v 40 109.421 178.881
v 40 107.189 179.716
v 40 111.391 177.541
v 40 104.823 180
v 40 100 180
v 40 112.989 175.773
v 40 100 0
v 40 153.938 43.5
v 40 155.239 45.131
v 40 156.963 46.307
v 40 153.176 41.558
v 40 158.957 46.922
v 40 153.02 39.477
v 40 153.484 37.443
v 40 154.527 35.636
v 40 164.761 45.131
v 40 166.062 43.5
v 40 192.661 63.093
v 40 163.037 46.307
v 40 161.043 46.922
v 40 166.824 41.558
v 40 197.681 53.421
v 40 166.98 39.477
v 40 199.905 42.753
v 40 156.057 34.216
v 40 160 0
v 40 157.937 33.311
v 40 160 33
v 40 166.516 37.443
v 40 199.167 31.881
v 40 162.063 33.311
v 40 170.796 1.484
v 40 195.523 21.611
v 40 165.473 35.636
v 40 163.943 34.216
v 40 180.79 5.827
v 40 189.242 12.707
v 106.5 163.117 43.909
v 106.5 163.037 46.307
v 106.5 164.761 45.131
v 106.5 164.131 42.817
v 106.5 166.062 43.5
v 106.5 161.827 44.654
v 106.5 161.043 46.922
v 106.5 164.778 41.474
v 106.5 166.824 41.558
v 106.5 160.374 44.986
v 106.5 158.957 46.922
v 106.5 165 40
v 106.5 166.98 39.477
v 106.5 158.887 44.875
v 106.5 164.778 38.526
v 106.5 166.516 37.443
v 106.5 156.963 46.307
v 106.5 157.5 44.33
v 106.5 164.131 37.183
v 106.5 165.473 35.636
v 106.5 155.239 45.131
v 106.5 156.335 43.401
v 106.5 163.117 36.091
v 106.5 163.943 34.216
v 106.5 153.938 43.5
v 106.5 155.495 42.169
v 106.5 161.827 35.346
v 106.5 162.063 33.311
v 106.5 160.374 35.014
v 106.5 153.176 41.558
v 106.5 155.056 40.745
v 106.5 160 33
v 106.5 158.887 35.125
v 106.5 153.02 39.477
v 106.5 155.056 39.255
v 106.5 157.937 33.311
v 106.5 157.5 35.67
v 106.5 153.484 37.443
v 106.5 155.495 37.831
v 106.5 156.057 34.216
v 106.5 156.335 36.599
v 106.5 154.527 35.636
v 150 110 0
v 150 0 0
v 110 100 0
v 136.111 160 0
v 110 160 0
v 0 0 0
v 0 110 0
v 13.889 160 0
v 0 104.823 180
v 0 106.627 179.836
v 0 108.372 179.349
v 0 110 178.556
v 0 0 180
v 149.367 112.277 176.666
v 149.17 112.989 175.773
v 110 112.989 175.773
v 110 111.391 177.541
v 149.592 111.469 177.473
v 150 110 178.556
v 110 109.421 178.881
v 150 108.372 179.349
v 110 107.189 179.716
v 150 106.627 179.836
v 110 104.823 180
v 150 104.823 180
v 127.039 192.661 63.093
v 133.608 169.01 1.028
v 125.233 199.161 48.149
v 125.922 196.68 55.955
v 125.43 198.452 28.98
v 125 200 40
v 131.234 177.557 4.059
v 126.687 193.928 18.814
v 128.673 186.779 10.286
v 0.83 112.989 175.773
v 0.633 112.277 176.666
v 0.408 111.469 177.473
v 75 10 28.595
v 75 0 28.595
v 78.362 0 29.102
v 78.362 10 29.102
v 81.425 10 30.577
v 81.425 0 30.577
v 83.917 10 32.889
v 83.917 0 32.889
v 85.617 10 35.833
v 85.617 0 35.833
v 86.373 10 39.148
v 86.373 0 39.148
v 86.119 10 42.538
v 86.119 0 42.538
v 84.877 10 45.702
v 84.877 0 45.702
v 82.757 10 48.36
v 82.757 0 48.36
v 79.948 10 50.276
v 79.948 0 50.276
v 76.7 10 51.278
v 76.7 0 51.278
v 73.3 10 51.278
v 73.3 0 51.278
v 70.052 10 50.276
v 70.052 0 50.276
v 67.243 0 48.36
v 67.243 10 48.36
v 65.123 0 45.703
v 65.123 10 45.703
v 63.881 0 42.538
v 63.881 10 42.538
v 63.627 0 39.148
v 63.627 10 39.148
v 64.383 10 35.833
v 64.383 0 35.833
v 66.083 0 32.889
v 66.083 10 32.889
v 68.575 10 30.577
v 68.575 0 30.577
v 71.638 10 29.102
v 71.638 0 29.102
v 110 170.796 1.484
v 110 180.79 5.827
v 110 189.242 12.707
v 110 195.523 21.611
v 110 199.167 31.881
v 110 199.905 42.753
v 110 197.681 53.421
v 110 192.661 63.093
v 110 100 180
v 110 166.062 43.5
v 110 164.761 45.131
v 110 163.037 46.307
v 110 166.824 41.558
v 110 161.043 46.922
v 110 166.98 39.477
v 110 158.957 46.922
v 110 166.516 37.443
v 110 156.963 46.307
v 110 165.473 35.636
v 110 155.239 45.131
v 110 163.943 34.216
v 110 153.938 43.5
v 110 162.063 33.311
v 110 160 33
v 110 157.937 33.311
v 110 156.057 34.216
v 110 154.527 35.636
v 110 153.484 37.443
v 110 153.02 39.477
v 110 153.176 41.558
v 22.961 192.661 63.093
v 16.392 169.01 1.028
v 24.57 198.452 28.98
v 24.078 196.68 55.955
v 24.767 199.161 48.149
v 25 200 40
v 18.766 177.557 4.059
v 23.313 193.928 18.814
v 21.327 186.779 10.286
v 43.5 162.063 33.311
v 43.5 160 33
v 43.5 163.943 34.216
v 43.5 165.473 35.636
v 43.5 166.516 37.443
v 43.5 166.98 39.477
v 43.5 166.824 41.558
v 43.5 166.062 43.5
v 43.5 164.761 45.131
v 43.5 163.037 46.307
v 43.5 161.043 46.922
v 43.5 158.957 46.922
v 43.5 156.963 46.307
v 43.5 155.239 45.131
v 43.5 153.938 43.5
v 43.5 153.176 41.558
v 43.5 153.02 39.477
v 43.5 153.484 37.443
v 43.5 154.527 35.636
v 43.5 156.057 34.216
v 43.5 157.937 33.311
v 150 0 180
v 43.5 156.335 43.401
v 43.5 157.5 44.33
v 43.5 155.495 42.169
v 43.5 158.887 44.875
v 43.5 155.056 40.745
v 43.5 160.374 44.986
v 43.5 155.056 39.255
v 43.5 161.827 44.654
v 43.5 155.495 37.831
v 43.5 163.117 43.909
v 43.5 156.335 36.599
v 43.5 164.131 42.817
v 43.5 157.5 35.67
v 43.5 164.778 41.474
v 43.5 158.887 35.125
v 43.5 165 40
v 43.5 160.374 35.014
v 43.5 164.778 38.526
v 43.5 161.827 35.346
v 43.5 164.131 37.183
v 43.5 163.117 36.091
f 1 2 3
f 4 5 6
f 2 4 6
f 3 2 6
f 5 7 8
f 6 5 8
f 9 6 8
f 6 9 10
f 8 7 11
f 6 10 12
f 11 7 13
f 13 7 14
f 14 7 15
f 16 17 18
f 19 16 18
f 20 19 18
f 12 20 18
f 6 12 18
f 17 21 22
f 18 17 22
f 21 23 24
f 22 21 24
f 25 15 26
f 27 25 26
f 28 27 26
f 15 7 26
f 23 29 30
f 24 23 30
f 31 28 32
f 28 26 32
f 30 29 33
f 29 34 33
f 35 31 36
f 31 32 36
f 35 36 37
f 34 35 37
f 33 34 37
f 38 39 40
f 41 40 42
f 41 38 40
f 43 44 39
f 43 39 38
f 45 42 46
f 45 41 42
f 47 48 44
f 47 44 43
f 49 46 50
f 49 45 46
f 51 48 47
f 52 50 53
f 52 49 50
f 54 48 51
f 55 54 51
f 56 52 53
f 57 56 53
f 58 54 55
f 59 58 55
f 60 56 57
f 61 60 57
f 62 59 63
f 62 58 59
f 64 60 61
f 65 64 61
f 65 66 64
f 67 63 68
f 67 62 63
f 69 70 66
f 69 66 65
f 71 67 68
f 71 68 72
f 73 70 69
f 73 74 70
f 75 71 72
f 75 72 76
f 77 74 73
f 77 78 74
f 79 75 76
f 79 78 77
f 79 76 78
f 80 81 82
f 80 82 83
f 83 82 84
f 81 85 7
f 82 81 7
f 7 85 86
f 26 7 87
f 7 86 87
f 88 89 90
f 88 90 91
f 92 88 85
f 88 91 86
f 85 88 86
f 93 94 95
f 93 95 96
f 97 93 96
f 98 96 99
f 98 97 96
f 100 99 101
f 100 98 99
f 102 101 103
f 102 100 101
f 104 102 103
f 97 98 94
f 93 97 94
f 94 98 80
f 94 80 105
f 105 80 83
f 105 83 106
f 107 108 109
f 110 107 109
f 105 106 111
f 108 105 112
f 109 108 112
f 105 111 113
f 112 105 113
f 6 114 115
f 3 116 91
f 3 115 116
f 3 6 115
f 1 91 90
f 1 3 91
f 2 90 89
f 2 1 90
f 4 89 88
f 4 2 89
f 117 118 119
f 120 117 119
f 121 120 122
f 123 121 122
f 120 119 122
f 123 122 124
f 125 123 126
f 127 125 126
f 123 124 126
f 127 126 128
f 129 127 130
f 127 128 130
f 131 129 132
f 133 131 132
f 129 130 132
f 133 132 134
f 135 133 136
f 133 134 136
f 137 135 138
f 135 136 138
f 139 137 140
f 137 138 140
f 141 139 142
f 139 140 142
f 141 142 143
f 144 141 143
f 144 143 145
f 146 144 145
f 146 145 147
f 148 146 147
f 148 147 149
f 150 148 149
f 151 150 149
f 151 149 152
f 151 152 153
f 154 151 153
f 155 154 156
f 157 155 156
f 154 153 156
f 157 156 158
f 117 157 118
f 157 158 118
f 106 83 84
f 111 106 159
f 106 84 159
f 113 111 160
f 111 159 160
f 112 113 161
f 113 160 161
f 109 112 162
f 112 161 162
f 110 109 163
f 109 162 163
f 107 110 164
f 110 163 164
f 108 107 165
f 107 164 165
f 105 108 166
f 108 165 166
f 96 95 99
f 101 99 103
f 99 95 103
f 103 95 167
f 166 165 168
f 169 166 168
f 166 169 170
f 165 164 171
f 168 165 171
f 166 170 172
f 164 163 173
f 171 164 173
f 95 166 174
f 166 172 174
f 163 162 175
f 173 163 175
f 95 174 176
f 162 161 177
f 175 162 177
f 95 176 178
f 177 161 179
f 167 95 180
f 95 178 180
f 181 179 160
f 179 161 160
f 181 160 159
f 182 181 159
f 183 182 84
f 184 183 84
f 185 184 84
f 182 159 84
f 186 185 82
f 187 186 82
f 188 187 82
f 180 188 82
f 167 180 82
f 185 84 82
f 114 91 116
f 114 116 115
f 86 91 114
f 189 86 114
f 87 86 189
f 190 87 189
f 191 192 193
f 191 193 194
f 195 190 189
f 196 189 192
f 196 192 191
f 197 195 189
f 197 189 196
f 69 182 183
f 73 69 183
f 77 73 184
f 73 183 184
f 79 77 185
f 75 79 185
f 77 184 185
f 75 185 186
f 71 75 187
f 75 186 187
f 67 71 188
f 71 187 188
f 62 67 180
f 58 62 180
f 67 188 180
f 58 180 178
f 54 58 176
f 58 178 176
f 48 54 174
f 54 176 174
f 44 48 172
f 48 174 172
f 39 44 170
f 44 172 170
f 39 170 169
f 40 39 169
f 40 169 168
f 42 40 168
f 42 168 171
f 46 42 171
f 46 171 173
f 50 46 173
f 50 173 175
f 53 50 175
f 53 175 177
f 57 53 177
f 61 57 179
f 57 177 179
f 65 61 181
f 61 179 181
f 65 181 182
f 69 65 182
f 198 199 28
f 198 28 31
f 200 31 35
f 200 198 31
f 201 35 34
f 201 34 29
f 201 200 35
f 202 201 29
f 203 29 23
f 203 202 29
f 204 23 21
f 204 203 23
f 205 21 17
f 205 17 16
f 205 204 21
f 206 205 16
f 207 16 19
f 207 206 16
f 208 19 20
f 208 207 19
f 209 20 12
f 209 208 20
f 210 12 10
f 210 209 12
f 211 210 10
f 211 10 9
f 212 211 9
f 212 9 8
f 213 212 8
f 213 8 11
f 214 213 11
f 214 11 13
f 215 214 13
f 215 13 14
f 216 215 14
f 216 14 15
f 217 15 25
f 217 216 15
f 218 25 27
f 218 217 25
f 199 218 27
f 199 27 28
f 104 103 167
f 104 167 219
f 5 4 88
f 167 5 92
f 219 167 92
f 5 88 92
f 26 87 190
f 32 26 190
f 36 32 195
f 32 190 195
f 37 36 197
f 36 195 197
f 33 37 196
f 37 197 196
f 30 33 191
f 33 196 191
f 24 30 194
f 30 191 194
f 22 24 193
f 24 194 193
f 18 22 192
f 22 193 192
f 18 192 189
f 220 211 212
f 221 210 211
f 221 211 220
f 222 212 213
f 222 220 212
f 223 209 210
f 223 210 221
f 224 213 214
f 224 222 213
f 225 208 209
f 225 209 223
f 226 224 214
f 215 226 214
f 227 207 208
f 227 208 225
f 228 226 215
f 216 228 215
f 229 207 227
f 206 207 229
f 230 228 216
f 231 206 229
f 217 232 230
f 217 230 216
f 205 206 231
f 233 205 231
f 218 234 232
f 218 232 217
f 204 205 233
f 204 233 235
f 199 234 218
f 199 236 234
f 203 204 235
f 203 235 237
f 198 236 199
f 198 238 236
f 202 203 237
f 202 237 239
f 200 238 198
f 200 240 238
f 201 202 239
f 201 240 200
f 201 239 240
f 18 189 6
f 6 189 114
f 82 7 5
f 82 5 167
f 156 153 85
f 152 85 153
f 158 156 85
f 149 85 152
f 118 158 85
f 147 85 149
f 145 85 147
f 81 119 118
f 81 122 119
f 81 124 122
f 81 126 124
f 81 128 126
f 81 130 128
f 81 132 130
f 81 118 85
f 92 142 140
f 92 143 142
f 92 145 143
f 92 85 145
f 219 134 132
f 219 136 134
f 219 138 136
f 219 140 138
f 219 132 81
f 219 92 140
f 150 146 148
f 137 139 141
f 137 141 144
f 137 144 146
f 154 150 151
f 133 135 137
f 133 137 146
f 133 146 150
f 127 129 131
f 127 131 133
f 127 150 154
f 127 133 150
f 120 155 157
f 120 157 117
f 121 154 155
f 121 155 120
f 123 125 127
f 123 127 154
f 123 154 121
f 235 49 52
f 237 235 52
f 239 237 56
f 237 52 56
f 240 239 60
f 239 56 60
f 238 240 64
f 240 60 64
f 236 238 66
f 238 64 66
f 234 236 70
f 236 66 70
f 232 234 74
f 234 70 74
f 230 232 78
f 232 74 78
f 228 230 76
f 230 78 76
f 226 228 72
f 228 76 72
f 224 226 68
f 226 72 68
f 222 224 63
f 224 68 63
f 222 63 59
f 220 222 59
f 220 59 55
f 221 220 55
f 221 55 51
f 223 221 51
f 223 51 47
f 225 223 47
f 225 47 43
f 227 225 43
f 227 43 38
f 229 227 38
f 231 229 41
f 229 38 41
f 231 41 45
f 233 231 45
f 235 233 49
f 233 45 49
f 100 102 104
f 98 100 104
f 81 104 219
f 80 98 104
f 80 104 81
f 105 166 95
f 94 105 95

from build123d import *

# Parameters (mm, degrees)
EXTRUDE_1_DEPTH         = 150
FILLET_1_R              = 10
CUT_EXTRUDE_1_DEPTH     = 309.058436015
SKETCH1_R               = 12.5
CUT_EXTRUDE1_DEPTH      = 10
CUT_EXTRUDE2_DEPTH      = 80
CUT_EXTRUDE2_DEPTH_BACK = 10
SKETCH2_R               = 5
SKETCH4_R               = 12.5
SKETCH4_R_2             = 11.405
BOSS_EXTRUDE1_DEPTH     = 10
SKETCH8_R               = 5
BOSS_EXTRUDE3_DEPTH     = 90
SKETCH9_R               = 7
SKETCH9_R_2             = 5
BOSS_EXTRUDE4_DEPTH     = 3.5
BOSS_EXTRUDE5_START     = 3.5
SKETCH10_R              = 7
SKETCH10_R_2            = 5
BOSS_EXTRUDE5_DEPTH     = 3.5


with BuildPart() as part:
    # 草圖1 → 填料-伸長1 (new body)
    with BuildSketch(Plane(origin=(0, 0, 0), x_dir=(0, 0, -1), z_dir=(1, 0, 0))):
        with BuildLine():
            Line((0, 0), (0, 160))
            ThreePointArc((0, 160), (-21.611444176, 195.522683101), (-63.093050736, 192.660542061))
            Line((-63.093050736, 192.660542061), (-180, 110))
            Line((-180, 110), (-180, 0))
            Line((-180, 0), (0, 0))
        make_face()
    extrude(amount=EXTRUDE_1_DEPTH)

    # 圓角1
    fillet_1_edges = [part.edges().sort_by_distance(p)[0] for p in [
        (75, 110, 180),
    ]]
    fillet(fillet_1_edges, radius=FILLET_1_R)

    # 草圖2 → 除料-伸長1 (cut, through all)
    with BuildSketch(Plane(origin=(0, 0, 0), x_dir=(-1, 0, 0), z_dir=(0, 0, -1))):
        Polygon((-150, 110), (-125, 200), (-125, 212.317241835), (-176.077029544, 212.317241835), (-176.077029544, 111.407234288), align=None)
        Polygon((-110, 110), (-110, 202.916849344), (-40, 202.916849344), (-40, 110), (-40, 100), (-110, 100), align=None)
        Polygon((26.077029544, 111.407234288), (0, 110), (-25, 200), (-25, 212.317241835), (26.077029544, 212.317241835), align=None)
    extrude(amount=-CUT_EXTRUDE_1_DEPTH, mode=Mode.SUBTRACT)

    # Sketch1 → Cut-Extrude1 (cut)
    with BuildSketch(Plane.XZ):
        with Locations(Location((75, 40, 0), (0, 0, 270))):
            Circle(SKETCH1_R)
    extrude(amount=-CUT_EXTRUDE1_DEPTH, mode=Mode.SUBTRACT)

    # Sketch2 → Cut-Extrude2 (cut, two sides: drawn at the far end of the back side and taken through both)
    with BuildSketch(Plane(origin=(40, 0, 0), x_dir=(0, 0, -1), z_dir=(1, 0, 0)).offset(-CUT_EXTRUDE2_DEPTH_BACK)):
        with Locations(Location((-40, 160, 0), (0, 0, 270))):
            Circle(SKETCH2_R)
    extrude(amount=CUT_EXTRUDE2_DEPTH + CUT_EXTRUDE2_DEPTH_BACK, mode=Mode.SUBTRACT)

    # Sketch4 → Boss-Extrude1 (add)
    with BuildSketch(Plane.XZ):
        with Locations((75, 40)):
            Circle(SKETCH4_R)
        with Locations(Location((75, 40, 0), (0, 0, 270))):
            Circle(SKETCH4_R_2, mode=Mode.SUBTRACT)
    extrude(amount=-BOSS_EXTRUDE1_DEPTH)

    # Sketch8 → Boss-Extrude3 (add)
    with BuildSketch(Plane.ZY.offset(-120)):
        with Locations(Location((40, 160, 0), (0, 0, 90))):
            Circle(SKETCH8_R)
    extrude(amount=BOSS_EXTRUDE3_DEPTH)

    # Sketch9 → Boss-Extrude4 (add)
    with BuildSketch(Plane.ZY.offset(-110)):
        with Locations(Location((40, 160, 0), (0, 0, 180))):
            Circle(SKETCH9_R)
        with Locations((40, 160)):
            Circle(SKETCH9_R_2, mode=Mode.SUBTRACT)
    extrude(amount=BOSS_EXTRUDE4_DEPTH)

    # Sketch10 → Boss-Extrude5 (add)
    with BuildSketch(Plane(origin=(40, 0, 0), x_dir=(0, 0, -1), z_dir=(1, 0, 0)).offset(BOSS_EXTRUDE5_START)):
        with Locations((-40, 160)):
            Circle(SKETCH10_R)
        with Locations(Location((-40, 160, 0), (0, 0, 90))):
            Circle(SKETCH10_R_2, mode=Mode.SUBTRACT)
    extrude(amount=-BOSS_EXTRUDE5_DEPTH)


solid = part.part
